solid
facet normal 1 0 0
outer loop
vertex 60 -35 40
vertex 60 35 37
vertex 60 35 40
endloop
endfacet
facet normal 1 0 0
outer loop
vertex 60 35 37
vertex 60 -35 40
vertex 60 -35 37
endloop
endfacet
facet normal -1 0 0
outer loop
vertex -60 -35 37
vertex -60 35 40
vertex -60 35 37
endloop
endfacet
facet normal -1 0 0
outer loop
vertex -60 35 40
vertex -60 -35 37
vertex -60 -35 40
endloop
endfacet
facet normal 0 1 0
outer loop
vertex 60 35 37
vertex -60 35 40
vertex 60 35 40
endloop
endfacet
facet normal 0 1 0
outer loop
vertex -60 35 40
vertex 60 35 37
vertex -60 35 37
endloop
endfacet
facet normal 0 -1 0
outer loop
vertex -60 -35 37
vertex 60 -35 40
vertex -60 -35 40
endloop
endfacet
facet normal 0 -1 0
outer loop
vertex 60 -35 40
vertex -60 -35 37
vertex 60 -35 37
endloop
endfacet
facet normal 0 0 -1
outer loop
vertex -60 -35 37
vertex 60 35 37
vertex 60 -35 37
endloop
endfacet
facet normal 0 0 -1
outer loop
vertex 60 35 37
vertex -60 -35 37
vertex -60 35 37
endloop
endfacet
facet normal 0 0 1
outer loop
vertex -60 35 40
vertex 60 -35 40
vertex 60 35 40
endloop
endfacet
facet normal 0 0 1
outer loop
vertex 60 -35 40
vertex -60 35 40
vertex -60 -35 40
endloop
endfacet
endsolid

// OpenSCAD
// Built by bench/smallmodels/features/compiler.py from a list of features.
$fn = 64;
difference() {
  union() {
    translate([0, 0, 0]) translate([-60, -35, 0]) cube([120, 70, 40]);
  }
  union() {
    translate([0, 0, -3]) rotate([0, 0, 0]) translate([-60, -35, 0]) cube([120, 70, 37]);
    translate([0, 0, -3]) rotate([0, 0, 0]) translate([-60, -35, 0]) cube([120, 70, 40]);
  }
}
